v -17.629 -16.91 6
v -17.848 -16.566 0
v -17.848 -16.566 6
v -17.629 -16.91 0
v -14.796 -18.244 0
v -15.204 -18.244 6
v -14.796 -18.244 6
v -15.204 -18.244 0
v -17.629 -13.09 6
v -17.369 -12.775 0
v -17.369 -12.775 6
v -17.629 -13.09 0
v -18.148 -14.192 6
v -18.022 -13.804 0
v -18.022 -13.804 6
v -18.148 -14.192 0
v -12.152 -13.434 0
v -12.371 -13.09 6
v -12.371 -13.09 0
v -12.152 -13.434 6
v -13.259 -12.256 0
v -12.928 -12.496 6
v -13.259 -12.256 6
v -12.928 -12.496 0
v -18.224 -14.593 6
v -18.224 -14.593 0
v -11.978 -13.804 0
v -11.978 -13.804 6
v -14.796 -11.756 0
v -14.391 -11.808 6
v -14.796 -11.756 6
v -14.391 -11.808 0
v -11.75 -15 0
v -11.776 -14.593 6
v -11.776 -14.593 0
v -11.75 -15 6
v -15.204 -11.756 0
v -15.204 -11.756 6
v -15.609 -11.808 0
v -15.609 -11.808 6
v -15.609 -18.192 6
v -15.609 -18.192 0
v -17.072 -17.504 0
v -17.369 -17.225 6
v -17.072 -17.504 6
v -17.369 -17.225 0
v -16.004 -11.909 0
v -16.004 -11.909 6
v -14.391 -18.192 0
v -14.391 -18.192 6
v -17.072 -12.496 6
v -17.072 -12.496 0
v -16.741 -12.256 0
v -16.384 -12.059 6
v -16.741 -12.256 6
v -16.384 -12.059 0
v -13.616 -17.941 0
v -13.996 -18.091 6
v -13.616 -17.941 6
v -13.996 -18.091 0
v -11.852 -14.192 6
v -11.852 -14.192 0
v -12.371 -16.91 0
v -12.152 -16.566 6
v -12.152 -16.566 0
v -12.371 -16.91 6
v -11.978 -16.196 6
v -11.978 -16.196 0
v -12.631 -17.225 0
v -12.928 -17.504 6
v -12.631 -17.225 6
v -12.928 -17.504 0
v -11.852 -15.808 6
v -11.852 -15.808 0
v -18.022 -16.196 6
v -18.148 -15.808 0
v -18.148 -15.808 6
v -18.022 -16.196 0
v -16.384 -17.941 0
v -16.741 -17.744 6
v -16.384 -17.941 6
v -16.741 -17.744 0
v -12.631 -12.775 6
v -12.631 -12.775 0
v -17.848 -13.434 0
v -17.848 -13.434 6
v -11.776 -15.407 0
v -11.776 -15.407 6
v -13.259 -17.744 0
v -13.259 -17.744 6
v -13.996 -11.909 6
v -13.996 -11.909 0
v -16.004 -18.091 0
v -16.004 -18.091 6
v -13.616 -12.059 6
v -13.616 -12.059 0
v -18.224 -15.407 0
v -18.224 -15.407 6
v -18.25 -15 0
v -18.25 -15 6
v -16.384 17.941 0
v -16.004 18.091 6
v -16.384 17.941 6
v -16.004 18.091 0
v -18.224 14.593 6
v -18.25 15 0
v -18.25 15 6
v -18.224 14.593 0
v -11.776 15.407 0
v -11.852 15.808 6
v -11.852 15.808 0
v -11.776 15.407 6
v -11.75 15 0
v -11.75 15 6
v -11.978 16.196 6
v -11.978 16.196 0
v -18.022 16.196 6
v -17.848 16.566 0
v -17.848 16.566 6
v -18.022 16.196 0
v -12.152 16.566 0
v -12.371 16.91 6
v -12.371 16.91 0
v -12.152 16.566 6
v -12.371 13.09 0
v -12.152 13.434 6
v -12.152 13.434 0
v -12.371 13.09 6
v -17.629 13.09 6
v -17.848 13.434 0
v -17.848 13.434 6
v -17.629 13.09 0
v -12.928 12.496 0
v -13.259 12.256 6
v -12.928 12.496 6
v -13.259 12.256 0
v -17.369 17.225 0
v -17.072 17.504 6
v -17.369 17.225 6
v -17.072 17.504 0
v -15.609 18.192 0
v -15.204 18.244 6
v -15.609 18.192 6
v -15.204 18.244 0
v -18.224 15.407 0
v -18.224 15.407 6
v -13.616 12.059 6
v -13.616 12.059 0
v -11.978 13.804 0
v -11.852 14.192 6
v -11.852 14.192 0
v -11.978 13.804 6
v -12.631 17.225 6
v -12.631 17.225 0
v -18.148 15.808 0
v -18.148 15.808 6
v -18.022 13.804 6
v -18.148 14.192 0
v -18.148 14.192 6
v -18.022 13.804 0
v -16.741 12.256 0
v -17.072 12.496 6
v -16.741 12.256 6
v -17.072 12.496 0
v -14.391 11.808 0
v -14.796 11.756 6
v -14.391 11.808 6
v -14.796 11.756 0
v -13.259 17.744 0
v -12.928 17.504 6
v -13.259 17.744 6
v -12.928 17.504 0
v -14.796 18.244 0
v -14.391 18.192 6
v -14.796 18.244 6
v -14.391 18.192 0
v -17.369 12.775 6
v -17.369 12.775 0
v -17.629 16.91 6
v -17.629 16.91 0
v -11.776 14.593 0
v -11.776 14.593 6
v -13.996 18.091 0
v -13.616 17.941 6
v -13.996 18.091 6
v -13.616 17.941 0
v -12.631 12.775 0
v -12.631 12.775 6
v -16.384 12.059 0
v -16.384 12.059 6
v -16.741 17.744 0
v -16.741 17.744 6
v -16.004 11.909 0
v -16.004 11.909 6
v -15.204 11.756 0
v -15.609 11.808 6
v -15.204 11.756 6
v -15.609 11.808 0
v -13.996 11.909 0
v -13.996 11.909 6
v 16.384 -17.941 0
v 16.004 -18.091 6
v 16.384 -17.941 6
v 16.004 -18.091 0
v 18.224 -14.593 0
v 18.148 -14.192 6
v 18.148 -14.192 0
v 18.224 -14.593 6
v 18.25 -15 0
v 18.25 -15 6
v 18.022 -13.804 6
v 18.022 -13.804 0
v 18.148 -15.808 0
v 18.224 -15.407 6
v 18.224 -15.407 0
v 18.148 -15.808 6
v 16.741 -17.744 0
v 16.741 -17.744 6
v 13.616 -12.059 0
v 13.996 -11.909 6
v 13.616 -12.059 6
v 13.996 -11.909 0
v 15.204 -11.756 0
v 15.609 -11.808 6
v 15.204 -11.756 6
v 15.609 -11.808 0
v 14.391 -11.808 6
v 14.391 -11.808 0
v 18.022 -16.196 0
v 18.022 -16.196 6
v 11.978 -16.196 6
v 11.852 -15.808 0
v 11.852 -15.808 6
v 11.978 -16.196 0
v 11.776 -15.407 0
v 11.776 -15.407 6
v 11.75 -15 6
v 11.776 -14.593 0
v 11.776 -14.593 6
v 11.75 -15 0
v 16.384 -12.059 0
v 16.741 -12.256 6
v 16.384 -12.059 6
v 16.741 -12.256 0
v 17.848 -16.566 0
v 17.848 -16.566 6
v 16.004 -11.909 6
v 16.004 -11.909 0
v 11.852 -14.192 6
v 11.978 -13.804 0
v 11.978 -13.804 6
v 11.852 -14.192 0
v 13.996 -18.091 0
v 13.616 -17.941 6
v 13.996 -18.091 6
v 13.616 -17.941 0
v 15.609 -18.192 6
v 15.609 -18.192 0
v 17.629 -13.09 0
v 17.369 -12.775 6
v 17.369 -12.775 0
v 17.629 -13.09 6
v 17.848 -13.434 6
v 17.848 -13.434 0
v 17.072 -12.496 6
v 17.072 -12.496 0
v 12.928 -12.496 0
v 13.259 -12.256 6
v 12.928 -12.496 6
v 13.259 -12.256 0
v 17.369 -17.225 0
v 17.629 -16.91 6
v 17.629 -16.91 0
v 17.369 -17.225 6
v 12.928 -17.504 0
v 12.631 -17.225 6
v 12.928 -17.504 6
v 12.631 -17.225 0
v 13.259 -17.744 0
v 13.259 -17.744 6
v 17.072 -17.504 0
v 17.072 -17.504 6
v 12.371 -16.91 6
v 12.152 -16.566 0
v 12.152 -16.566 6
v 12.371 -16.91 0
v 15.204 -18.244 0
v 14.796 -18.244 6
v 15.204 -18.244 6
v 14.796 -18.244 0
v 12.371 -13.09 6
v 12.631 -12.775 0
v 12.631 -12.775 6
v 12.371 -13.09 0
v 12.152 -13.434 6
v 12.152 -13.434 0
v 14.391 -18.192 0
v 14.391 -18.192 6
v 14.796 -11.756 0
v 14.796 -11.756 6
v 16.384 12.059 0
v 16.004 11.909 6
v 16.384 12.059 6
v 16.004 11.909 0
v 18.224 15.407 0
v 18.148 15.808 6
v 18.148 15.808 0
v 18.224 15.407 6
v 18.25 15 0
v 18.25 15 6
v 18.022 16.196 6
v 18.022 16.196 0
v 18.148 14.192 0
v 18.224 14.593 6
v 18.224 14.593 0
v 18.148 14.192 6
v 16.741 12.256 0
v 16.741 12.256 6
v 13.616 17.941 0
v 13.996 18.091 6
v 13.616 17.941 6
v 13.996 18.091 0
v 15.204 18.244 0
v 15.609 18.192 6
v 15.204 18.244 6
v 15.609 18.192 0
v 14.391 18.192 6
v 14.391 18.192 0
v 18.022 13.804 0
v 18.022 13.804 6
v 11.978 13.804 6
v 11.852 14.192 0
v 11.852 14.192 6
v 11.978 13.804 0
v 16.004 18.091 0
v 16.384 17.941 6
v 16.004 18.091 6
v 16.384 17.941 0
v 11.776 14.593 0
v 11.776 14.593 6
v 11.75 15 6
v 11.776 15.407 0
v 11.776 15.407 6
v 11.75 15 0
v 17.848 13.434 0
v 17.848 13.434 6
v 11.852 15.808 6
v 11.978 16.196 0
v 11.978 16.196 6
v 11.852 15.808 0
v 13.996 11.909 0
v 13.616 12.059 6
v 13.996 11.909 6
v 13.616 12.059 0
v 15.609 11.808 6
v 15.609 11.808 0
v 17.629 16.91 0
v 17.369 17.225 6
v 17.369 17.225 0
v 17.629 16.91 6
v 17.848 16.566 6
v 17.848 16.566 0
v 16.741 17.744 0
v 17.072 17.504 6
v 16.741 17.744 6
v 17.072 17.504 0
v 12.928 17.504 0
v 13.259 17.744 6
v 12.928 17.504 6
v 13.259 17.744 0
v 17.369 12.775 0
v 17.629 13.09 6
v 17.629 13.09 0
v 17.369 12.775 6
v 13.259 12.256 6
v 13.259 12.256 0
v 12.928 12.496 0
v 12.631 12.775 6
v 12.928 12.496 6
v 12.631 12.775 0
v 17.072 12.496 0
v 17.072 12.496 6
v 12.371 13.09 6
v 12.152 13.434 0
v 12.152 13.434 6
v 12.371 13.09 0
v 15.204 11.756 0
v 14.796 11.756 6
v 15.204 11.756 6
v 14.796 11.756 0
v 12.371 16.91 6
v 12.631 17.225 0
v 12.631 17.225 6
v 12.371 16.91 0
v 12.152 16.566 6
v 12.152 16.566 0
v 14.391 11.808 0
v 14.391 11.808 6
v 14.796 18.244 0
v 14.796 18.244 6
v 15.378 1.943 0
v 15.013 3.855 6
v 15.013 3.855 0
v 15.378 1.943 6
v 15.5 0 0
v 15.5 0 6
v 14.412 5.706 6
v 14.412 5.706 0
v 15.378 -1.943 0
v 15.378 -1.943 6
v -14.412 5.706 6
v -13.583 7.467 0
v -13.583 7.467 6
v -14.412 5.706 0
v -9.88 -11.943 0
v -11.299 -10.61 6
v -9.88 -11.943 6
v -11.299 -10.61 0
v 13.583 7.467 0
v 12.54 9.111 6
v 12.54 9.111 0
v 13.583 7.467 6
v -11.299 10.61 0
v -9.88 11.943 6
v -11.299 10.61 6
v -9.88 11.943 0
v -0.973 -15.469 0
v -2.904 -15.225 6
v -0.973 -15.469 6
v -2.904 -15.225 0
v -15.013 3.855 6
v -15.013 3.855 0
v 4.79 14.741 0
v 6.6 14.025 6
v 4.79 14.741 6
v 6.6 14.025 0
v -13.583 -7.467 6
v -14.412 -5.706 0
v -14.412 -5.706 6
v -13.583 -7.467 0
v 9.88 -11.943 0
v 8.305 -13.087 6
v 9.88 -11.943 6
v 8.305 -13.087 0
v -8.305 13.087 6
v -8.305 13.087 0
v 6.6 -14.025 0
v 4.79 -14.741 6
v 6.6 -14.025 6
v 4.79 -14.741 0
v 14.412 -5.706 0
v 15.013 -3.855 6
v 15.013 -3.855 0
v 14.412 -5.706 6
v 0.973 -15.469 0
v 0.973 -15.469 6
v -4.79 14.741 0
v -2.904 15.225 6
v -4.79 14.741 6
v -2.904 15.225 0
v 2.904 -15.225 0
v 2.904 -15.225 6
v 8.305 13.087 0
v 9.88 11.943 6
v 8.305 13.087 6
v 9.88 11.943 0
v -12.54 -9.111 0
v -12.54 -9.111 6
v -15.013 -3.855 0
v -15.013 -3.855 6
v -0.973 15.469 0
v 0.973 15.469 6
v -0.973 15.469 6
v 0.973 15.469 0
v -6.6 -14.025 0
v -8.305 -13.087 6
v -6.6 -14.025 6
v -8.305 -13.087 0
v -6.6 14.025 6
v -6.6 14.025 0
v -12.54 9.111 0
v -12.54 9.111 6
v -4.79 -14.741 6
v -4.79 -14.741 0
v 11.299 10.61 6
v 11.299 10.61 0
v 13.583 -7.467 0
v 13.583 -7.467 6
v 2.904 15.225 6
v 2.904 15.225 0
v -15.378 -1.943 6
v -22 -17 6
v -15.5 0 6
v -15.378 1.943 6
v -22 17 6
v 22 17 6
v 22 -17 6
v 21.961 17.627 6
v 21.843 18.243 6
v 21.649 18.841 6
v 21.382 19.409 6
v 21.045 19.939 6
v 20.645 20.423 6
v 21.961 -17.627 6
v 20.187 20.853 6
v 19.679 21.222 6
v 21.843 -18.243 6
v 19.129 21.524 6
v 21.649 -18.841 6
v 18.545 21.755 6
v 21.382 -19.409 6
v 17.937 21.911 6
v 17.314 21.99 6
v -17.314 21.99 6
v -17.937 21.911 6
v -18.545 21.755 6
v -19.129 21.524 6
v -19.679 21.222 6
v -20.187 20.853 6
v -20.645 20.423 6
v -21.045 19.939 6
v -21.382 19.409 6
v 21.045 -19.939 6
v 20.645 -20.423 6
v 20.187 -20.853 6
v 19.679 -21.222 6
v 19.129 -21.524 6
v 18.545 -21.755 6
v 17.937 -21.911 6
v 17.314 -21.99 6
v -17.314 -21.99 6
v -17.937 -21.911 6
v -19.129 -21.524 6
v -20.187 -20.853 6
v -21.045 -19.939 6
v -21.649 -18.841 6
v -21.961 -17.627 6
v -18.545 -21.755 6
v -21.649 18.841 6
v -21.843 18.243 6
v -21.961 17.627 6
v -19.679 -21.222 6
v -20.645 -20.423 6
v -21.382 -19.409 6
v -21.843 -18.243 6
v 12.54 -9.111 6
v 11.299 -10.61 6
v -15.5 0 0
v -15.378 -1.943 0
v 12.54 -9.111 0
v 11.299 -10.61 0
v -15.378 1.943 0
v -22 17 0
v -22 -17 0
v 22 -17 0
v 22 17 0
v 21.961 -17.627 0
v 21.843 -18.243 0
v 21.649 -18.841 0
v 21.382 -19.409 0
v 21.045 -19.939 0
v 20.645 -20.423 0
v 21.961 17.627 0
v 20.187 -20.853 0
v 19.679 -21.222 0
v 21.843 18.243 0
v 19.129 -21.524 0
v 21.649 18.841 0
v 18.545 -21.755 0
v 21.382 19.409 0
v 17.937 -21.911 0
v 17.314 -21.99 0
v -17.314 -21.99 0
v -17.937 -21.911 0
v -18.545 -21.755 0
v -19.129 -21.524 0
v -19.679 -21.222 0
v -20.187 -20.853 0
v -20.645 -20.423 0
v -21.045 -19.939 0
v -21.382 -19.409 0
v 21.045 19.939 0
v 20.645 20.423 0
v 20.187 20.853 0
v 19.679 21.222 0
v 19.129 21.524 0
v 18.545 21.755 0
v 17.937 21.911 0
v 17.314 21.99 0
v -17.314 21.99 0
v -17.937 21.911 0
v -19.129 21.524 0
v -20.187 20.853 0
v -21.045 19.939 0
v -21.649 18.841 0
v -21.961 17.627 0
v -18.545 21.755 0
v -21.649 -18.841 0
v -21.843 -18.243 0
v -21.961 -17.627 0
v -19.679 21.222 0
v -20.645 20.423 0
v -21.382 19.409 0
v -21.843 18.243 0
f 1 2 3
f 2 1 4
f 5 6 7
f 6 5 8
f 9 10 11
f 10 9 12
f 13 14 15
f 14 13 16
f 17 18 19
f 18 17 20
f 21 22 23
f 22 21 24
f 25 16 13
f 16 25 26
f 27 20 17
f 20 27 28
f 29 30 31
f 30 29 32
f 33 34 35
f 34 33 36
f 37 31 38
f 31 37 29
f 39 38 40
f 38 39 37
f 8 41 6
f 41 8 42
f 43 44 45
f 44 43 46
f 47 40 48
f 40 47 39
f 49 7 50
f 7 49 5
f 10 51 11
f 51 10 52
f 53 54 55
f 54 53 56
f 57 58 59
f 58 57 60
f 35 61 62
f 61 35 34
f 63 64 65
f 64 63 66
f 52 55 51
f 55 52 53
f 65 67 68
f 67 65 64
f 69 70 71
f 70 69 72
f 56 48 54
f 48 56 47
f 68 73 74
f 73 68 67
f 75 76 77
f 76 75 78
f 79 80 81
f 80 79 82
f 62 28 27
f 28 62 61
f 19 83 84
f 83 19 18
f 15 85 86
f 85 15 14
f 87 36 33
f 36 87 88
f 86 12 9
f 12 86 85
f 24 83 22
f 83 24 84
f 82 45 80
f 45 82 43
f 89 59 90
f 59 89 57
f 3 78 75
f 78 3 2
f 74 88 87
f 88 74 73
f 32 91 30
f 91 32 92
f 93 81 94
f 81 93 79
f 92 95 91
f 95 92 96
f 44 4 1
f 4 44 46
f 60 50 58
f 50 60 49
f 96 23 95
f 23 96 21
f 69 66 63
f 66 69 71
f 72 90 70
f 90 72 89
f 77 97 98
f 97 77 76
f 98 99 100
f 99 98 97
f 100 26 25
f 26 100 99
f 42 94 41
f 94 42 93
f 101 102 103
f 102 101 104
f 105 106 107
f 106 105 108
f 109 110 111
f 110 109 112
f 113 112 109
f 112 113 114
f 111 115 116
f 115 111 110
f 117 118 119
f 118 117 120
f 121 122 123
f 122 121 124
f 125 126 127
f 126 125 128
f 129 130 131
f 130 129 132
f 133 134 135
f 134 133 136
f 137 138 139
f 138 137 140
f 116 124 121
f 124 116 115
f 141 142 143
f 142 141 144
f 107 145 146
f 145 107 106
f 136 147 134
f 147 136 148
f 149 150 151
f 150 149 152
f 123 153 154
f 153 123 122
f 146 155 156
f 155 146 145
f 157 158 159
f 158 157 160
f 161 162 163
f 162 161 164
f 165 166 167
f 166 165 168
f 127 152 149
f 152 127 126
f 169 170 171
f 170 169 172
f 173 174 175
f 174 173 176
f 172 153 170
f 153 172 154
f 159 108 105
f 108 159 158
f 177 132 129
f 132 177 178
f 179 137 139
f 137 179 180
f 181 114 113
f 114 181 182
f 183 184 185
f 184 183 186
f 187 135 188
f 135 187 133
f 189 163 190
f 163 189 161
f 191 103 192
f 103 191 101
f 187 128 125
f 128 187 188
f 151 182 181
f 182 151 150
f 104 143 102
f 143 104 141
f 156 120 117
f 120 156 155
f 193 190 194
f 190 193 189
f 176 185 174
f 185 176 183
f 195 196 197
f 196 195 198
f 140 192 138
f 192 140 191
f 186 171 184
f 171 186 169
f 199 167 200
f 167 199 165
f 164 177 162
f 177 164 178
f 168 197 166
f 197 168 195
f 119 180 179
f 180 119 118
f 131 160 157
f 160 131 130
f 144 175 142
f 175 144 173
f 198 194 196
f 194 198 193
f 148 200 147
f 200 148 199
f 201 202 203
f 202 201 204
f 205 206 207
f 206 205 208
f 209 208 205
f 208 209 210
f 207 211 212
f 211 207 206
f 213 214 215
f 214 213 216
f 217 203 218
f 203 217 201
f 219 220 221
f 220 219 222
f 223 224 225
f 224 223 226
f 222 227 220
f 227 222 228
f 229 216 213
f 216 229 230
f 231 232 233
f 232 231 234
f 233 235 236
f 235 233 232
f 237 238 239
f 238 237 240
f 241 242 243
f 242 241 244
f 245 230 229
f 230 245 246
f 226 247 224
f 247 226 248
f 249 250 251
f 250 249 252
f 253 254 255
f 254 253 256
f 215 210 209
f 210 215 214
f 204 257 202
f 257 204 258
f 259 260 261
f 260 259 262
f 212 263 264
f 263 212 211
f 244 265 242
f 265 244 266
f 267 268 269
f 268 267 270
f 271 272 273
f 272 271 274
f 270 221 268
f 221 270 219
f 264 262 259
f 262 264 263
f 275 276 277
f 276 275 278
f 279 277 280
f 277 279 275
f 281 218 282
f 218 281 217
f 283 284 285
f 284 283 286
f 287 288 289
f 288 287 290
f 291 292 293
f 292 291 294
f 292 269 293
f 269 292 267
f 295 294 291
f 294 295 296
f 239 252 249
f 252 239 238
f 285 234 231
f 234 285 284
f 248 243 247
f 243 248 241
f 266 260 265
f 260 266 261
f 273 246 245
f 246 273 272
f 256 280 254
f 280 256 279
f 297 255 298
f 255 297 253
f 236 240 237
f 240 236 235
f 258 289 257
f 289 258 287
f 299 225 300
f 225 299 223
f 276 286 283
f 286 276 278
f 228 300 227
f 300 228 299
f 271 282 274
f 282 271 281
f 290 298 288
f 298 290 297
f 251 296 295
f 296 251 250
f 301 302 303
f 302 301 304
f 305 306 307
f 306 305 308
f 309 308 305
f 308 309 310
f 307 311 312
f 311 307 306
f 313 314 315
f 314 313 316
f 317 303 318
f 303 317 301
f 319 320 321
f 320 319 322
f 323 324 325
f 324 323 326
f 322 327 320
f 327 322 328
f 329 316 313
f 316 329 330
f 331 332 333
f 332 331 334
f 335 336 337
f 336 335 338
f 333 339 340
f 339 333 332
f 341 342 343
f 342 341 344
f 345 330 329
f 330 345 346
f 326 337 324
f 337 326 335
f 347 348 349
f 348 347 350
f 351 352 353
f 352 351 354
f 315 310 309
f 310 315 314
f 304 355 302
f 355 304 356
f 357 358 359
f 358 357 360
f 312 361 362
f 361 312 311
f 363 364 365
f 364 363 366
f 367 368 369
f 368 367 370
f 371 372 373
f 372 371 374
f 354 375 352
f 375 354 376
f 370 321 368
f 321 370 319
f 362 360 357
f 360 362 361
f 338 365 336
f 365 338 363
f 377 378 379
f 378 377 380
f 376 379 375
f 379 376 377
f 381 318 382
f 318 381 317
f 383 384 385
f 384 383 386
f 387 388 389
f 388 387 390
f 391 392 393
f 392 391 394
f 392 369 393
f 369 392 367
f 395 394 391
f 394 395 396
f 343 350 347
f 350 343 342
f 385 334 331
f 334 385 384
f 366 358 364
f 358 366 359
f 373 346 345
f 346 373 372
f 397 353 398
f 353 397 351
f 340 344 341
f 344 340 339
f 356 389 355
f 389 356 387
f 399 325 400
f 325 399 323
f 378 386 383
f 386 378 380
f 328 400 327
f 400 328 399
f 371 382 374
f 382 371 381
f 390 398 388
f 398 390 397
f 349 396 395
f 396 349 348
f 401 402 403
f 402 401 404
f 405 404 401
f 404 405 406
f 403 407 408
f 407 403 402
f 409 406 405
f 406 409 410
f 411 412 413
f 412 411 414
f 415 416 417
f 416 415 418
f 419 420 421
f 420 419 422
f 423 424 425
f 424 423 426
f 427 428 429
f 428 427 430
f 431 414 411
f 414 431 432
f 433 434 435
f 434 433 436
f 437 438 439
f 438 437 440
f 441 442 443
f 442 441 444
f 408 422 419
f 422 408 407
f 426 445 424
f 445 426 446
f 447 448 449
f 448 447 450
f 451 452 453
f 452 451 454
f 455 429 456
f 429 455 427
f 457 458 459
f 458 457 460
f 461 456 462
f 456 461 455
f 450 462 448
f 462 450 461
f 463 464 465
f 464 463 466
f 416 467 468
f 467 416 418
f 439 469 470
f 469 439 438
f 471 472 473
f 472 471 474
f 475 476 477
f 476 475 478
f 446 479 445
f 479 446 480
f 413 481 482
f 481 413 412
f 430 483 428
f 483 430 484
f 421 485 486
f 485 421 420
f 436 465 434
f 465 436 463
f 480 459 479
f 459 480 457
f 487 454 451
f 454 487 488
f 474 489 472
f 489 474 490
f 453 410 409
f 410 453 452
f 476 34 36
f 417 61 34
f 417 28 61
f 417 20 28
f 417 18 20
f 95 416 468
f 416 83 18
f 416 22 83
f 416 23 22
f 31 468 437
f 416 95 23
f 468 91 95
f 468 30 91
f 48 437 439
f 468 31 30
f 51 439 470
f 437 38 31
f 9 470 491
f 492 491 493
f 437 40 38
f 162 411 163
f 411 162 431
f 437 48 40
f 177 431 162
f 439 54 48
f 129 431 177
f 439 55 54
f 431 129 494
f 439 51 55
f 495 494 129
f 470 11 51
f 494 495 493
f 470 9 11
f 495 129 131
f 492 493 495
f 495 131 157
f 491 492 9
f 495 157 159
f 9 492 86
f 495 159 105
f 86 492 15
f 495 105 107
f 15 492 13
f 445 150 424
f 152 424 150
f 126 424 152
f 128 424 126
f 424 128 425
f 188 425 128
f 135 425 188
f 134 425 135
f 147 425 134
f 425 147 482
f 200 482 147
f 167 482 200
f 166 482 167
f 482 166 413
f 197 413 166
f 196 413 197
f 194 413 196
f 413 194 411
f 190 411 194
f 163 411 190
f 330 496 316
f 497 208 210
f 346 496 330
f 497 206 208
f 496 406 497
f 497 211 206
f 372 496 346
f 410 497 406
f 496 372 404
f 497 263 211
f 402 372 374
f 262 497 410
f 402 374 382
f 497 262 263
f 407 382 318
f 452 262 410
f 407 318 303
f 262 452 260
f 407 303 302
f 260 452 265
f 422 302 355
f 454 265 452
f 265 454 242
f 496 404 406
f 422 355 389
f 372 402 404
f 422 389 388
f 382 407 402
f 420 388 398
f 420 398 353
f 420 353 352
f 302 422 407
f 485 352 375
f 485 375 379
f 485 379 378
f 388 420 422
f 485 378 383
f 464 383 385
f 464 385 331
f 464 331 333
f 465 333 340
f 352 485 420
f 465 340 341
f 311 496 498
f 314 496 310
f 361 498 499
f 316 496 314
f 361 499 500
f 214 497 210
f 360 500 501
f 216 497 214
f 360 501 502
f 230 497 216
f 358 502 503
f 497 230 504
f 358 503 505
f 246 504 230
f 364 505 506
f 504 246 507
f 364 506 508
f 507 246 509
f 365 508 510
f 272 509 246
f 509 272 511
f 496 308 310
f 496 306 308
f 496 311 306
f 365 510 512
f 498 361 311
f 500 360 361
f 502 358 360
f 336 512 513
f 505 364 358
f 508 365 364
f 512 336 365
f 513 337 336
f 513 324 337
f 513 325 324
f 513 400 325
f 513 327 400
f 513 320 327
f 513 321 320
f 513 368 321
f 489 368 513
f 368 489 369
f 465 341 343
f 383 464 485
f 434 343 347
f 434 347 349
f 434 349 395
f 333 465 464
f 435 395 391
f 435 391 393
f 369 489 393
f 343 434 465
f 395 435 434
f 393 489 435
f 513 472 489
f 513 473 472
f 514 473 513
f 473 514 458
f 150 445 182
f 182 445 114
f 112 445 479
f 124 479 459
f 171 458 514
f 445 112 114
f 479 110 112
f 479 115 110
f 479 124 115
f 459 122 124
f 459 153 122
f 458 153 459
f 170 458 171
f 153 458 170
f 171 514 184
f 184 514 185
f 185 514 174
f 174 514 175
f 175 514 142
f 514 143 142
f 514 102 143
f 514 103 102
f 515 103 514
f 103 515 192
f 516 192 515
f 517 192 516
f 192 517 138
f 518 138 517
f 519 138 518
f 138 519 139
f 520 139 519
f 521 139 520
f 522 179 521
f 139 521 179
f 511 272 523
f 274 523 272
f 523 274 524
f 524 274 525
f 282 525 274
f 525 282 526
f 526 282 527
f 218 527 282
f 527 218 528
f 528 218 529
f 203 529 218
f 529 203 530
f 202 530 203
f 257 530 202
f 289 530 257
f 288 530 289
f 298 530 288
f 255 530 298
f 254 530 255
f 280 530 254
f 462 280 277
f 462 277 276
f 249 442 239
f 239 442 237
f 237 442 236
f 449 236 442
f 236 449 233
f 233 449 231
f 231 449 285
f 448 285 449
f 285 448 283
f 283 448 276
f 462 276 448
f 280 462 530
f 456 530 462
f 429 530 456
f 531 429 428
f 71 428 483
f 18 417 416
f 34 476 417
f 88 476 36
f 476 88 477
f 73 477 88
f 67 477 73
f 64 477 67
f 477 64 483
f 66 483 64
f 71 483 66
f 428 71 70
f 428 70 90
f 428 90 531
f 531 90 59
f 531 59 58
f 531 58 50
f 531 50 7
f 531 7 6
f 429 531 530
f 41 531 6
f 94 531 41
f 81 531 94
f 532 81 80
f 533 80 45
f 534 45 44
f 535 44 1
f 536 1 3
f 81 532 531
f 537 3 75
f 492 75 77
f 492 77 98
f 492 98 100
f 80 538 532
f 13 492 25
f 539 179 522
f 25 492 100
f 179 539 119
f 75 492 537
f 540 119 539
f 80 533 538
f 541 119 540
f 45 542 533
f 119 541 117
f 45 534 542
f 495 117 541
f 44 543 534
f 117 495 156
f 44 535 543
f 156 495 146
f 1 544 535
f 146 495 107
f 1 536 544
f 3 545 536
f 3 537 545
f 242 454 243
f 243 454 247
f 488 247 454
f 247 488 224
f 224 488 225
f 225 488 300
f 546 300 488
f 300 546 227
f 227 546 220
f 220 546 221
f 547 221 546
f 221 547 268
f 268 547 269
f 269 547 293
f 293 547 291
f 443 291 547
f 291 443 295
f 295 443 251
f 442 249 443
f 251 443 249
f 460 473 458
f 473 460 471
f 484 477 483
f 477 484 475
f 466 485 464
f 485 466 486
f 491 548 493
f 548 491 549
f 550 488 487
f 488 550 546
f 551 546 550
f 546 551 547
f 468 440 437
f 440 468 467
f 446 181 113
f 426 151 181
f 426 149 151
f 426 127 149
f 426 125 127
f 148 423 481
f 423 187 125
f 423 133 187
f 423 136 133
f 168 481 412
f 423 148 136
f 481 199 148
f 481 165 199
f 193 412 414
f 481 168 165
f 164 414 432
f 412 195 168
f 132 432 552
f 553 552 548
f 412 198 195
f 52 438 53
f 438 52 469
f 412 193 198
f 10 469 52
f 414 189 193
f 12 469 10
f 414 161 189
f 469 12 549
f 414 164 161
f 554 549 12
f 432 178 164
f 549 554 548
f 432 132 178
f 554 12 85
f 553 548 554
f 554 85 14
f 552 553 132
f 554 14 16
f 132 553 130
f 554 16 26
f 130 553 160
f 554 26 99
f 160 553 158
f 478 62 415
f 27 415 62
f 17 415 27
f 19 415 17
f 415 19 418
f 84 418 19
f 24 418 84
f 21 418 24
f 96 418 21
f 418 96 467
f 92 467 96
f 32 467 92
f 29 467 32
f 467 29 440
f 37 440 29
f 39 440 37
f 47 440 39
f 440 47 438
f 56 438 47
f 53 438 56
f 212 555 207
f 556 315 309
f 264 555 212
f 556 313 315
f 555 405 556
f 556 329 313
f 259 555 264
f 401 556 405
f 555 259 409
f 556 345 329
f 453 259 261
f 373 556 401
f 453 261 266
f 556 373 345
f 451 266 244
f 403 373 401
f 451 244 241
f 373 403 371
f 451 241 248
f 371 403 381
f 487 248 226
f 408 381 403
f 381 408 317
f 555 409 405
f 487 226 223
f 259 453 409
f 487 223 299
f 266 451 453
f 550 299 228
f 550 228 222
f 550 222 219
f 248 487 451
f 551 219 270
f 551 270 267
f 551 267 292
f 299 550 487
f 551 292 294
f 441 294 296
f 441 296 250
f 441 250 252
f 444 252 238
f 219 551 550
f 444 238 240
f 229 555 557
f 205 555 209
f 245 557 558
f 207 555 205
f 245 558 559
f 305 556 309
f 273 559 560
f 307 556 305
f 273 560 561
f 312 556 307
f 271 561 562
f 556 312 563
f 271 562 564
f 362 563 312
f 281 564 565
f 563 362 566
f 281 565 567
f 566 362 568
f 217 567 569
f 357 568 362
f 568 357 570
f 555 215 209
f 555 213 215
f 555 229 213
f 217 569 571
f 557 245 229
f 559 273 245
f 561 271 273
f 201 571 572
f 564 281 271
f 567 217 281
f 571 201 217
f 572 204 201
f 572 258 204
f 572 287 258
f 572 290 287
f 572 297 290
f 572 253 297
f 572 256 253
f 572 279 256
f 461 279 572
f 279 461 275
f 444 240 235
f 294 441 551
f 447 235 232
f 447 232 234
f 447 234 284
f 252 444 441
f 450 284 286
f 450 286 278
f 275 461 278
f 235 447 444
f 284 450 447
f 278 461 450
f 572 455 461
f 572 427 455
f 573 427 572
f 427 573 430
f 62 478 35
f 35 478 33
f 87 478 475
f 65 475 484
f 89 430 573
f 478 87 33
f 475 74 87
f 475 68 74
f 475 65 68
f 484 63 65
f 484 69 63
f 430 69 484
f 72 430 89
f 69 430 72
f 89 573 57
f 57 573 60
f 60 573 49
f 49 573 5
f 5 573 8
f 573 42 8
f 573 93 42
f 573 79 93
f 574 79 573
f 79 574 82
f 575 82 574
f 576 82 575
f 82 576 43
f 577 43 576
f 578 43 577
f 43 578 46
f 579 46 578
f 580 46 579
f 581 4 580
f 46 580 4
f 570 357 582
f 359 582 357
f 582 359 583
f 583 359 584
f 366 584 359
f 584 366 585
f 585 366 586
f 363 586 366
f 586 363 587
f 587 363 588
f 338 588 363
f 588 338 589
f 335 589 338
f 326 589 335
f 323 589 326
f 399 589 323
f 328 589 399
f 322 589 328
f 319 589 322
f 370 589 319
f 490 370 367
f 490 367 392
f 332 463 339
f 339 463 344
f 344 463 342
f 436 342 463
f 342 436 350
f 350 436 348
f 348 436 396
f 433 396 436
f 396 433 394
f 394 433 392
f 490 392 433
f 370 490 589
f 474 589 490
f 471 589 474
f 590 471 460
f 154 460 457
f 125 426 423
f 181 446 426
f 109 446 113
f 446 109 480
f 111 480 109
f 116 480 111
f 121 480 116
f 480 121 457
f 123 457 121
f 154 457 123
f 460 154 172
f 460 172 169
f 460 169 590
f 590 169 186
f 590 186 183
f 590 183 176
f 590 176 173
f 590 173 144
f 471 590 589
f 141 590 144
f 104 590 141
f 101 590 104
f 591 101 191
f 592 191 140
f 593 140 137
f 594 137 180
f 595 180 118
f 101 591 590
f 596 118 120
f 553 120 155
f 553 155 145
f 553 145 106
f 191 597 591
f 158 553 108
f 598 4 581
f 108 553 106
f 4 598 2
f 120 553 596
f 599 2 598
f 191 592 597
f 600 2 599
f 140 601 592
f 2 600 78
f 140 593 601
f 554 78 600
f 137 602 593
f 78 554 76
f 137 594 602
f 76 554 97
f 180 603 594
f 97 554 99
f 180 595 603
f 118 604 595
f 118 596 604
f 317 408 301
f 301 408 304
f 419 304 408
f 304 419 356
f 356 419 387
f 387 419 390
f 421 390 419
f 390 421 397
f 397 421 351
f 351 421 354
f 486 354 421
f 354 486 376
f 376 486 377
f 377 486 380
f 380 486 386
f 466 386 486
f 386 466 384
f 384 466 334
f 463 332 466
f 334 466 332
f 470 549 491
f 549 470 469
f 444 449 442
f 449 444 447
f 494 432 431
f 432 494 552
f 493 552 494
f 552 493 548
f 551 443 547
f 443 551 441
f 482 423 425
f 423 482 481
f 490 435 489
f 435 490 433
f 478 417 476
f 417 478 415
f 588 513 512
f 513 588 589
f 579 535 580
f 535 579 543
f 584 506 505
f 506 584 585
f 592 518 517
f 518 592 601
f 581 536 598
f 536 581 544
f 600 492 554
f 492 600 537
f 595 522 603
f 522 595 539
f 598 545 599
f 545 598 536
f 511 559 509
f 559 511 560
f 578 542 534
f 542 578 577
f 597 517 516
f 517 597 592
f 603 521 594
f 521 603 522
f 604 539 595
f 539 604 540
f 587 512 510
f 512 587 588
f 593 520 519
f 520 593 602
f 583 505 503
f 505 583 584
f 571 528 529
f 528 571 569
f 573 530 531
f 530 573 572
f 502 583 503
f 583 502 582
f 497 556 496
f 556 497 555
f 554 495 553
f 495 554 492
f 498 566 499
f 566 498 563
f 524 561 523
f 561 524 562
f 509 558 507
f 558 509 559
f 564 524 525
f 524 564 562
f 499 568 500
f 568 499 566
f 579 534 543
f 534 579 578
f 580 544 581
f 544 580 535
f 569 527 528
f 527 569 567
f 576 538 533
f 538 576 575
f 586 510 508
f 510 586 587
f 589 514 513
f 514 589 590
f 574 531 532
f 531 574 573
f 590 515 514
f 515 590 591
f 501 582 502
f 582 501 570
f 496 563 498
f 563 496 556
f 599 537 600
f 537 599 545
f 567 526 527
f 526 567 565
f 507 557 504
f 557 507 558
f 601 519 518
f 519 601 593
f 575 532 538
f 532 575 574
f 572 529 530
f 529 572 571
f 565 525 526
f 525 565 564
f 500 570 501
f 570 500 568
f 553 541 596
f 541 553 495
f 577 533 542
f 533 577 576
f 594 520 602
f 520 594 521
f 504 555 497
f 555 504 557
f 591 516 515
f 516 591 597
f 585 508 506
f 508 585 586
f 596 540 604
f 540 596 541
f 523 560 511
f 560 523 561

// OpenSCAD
$fn = 50;


difference() {
	union() {
		hull() {
			translate(v = [-17.0000000000, 17.0000000000, 0]) {
				cylinder(h = 6, r = 5);
			}
			translate(v = [17.0000000000, 17.0000000000, 0]) {
				cylinder(h = 6, r = 5);
			}
			translate(v = [-17.0000000000, -17.0000000000, 0]) {
				cylinder(h = 6, r = 5);
			}
			translate(v = [17.0000000000, -17.0000000000, 0]) {
				cylinder(h = 6, r = 5);
			}
		}
	}
	union() {
		#translate(v = [-15.0000000000, -15.0000000000, -100.0000000000]) {
			cylinder(h = 200, r = 3.2500000000);
		}
		#translate(v = [-15.0000000000, 15.0000000000, -100.0000000000]) {
			cylinder(h = 200, r = 3.2500000000);
		}
		#translate(v = [15.0000000000, -15.0000000000, -100.0000000000]) {
			cylinder(h = 200, r = 3.2500000000);
		}
		#translate(v = [15.0000000000, 15.0000000000, -100.0000000000]) {
			cylinder(h = 200, r = 3.2500000000);
		}
		#cylinder(h = 6, r = 15.5000000000);
	}
}
